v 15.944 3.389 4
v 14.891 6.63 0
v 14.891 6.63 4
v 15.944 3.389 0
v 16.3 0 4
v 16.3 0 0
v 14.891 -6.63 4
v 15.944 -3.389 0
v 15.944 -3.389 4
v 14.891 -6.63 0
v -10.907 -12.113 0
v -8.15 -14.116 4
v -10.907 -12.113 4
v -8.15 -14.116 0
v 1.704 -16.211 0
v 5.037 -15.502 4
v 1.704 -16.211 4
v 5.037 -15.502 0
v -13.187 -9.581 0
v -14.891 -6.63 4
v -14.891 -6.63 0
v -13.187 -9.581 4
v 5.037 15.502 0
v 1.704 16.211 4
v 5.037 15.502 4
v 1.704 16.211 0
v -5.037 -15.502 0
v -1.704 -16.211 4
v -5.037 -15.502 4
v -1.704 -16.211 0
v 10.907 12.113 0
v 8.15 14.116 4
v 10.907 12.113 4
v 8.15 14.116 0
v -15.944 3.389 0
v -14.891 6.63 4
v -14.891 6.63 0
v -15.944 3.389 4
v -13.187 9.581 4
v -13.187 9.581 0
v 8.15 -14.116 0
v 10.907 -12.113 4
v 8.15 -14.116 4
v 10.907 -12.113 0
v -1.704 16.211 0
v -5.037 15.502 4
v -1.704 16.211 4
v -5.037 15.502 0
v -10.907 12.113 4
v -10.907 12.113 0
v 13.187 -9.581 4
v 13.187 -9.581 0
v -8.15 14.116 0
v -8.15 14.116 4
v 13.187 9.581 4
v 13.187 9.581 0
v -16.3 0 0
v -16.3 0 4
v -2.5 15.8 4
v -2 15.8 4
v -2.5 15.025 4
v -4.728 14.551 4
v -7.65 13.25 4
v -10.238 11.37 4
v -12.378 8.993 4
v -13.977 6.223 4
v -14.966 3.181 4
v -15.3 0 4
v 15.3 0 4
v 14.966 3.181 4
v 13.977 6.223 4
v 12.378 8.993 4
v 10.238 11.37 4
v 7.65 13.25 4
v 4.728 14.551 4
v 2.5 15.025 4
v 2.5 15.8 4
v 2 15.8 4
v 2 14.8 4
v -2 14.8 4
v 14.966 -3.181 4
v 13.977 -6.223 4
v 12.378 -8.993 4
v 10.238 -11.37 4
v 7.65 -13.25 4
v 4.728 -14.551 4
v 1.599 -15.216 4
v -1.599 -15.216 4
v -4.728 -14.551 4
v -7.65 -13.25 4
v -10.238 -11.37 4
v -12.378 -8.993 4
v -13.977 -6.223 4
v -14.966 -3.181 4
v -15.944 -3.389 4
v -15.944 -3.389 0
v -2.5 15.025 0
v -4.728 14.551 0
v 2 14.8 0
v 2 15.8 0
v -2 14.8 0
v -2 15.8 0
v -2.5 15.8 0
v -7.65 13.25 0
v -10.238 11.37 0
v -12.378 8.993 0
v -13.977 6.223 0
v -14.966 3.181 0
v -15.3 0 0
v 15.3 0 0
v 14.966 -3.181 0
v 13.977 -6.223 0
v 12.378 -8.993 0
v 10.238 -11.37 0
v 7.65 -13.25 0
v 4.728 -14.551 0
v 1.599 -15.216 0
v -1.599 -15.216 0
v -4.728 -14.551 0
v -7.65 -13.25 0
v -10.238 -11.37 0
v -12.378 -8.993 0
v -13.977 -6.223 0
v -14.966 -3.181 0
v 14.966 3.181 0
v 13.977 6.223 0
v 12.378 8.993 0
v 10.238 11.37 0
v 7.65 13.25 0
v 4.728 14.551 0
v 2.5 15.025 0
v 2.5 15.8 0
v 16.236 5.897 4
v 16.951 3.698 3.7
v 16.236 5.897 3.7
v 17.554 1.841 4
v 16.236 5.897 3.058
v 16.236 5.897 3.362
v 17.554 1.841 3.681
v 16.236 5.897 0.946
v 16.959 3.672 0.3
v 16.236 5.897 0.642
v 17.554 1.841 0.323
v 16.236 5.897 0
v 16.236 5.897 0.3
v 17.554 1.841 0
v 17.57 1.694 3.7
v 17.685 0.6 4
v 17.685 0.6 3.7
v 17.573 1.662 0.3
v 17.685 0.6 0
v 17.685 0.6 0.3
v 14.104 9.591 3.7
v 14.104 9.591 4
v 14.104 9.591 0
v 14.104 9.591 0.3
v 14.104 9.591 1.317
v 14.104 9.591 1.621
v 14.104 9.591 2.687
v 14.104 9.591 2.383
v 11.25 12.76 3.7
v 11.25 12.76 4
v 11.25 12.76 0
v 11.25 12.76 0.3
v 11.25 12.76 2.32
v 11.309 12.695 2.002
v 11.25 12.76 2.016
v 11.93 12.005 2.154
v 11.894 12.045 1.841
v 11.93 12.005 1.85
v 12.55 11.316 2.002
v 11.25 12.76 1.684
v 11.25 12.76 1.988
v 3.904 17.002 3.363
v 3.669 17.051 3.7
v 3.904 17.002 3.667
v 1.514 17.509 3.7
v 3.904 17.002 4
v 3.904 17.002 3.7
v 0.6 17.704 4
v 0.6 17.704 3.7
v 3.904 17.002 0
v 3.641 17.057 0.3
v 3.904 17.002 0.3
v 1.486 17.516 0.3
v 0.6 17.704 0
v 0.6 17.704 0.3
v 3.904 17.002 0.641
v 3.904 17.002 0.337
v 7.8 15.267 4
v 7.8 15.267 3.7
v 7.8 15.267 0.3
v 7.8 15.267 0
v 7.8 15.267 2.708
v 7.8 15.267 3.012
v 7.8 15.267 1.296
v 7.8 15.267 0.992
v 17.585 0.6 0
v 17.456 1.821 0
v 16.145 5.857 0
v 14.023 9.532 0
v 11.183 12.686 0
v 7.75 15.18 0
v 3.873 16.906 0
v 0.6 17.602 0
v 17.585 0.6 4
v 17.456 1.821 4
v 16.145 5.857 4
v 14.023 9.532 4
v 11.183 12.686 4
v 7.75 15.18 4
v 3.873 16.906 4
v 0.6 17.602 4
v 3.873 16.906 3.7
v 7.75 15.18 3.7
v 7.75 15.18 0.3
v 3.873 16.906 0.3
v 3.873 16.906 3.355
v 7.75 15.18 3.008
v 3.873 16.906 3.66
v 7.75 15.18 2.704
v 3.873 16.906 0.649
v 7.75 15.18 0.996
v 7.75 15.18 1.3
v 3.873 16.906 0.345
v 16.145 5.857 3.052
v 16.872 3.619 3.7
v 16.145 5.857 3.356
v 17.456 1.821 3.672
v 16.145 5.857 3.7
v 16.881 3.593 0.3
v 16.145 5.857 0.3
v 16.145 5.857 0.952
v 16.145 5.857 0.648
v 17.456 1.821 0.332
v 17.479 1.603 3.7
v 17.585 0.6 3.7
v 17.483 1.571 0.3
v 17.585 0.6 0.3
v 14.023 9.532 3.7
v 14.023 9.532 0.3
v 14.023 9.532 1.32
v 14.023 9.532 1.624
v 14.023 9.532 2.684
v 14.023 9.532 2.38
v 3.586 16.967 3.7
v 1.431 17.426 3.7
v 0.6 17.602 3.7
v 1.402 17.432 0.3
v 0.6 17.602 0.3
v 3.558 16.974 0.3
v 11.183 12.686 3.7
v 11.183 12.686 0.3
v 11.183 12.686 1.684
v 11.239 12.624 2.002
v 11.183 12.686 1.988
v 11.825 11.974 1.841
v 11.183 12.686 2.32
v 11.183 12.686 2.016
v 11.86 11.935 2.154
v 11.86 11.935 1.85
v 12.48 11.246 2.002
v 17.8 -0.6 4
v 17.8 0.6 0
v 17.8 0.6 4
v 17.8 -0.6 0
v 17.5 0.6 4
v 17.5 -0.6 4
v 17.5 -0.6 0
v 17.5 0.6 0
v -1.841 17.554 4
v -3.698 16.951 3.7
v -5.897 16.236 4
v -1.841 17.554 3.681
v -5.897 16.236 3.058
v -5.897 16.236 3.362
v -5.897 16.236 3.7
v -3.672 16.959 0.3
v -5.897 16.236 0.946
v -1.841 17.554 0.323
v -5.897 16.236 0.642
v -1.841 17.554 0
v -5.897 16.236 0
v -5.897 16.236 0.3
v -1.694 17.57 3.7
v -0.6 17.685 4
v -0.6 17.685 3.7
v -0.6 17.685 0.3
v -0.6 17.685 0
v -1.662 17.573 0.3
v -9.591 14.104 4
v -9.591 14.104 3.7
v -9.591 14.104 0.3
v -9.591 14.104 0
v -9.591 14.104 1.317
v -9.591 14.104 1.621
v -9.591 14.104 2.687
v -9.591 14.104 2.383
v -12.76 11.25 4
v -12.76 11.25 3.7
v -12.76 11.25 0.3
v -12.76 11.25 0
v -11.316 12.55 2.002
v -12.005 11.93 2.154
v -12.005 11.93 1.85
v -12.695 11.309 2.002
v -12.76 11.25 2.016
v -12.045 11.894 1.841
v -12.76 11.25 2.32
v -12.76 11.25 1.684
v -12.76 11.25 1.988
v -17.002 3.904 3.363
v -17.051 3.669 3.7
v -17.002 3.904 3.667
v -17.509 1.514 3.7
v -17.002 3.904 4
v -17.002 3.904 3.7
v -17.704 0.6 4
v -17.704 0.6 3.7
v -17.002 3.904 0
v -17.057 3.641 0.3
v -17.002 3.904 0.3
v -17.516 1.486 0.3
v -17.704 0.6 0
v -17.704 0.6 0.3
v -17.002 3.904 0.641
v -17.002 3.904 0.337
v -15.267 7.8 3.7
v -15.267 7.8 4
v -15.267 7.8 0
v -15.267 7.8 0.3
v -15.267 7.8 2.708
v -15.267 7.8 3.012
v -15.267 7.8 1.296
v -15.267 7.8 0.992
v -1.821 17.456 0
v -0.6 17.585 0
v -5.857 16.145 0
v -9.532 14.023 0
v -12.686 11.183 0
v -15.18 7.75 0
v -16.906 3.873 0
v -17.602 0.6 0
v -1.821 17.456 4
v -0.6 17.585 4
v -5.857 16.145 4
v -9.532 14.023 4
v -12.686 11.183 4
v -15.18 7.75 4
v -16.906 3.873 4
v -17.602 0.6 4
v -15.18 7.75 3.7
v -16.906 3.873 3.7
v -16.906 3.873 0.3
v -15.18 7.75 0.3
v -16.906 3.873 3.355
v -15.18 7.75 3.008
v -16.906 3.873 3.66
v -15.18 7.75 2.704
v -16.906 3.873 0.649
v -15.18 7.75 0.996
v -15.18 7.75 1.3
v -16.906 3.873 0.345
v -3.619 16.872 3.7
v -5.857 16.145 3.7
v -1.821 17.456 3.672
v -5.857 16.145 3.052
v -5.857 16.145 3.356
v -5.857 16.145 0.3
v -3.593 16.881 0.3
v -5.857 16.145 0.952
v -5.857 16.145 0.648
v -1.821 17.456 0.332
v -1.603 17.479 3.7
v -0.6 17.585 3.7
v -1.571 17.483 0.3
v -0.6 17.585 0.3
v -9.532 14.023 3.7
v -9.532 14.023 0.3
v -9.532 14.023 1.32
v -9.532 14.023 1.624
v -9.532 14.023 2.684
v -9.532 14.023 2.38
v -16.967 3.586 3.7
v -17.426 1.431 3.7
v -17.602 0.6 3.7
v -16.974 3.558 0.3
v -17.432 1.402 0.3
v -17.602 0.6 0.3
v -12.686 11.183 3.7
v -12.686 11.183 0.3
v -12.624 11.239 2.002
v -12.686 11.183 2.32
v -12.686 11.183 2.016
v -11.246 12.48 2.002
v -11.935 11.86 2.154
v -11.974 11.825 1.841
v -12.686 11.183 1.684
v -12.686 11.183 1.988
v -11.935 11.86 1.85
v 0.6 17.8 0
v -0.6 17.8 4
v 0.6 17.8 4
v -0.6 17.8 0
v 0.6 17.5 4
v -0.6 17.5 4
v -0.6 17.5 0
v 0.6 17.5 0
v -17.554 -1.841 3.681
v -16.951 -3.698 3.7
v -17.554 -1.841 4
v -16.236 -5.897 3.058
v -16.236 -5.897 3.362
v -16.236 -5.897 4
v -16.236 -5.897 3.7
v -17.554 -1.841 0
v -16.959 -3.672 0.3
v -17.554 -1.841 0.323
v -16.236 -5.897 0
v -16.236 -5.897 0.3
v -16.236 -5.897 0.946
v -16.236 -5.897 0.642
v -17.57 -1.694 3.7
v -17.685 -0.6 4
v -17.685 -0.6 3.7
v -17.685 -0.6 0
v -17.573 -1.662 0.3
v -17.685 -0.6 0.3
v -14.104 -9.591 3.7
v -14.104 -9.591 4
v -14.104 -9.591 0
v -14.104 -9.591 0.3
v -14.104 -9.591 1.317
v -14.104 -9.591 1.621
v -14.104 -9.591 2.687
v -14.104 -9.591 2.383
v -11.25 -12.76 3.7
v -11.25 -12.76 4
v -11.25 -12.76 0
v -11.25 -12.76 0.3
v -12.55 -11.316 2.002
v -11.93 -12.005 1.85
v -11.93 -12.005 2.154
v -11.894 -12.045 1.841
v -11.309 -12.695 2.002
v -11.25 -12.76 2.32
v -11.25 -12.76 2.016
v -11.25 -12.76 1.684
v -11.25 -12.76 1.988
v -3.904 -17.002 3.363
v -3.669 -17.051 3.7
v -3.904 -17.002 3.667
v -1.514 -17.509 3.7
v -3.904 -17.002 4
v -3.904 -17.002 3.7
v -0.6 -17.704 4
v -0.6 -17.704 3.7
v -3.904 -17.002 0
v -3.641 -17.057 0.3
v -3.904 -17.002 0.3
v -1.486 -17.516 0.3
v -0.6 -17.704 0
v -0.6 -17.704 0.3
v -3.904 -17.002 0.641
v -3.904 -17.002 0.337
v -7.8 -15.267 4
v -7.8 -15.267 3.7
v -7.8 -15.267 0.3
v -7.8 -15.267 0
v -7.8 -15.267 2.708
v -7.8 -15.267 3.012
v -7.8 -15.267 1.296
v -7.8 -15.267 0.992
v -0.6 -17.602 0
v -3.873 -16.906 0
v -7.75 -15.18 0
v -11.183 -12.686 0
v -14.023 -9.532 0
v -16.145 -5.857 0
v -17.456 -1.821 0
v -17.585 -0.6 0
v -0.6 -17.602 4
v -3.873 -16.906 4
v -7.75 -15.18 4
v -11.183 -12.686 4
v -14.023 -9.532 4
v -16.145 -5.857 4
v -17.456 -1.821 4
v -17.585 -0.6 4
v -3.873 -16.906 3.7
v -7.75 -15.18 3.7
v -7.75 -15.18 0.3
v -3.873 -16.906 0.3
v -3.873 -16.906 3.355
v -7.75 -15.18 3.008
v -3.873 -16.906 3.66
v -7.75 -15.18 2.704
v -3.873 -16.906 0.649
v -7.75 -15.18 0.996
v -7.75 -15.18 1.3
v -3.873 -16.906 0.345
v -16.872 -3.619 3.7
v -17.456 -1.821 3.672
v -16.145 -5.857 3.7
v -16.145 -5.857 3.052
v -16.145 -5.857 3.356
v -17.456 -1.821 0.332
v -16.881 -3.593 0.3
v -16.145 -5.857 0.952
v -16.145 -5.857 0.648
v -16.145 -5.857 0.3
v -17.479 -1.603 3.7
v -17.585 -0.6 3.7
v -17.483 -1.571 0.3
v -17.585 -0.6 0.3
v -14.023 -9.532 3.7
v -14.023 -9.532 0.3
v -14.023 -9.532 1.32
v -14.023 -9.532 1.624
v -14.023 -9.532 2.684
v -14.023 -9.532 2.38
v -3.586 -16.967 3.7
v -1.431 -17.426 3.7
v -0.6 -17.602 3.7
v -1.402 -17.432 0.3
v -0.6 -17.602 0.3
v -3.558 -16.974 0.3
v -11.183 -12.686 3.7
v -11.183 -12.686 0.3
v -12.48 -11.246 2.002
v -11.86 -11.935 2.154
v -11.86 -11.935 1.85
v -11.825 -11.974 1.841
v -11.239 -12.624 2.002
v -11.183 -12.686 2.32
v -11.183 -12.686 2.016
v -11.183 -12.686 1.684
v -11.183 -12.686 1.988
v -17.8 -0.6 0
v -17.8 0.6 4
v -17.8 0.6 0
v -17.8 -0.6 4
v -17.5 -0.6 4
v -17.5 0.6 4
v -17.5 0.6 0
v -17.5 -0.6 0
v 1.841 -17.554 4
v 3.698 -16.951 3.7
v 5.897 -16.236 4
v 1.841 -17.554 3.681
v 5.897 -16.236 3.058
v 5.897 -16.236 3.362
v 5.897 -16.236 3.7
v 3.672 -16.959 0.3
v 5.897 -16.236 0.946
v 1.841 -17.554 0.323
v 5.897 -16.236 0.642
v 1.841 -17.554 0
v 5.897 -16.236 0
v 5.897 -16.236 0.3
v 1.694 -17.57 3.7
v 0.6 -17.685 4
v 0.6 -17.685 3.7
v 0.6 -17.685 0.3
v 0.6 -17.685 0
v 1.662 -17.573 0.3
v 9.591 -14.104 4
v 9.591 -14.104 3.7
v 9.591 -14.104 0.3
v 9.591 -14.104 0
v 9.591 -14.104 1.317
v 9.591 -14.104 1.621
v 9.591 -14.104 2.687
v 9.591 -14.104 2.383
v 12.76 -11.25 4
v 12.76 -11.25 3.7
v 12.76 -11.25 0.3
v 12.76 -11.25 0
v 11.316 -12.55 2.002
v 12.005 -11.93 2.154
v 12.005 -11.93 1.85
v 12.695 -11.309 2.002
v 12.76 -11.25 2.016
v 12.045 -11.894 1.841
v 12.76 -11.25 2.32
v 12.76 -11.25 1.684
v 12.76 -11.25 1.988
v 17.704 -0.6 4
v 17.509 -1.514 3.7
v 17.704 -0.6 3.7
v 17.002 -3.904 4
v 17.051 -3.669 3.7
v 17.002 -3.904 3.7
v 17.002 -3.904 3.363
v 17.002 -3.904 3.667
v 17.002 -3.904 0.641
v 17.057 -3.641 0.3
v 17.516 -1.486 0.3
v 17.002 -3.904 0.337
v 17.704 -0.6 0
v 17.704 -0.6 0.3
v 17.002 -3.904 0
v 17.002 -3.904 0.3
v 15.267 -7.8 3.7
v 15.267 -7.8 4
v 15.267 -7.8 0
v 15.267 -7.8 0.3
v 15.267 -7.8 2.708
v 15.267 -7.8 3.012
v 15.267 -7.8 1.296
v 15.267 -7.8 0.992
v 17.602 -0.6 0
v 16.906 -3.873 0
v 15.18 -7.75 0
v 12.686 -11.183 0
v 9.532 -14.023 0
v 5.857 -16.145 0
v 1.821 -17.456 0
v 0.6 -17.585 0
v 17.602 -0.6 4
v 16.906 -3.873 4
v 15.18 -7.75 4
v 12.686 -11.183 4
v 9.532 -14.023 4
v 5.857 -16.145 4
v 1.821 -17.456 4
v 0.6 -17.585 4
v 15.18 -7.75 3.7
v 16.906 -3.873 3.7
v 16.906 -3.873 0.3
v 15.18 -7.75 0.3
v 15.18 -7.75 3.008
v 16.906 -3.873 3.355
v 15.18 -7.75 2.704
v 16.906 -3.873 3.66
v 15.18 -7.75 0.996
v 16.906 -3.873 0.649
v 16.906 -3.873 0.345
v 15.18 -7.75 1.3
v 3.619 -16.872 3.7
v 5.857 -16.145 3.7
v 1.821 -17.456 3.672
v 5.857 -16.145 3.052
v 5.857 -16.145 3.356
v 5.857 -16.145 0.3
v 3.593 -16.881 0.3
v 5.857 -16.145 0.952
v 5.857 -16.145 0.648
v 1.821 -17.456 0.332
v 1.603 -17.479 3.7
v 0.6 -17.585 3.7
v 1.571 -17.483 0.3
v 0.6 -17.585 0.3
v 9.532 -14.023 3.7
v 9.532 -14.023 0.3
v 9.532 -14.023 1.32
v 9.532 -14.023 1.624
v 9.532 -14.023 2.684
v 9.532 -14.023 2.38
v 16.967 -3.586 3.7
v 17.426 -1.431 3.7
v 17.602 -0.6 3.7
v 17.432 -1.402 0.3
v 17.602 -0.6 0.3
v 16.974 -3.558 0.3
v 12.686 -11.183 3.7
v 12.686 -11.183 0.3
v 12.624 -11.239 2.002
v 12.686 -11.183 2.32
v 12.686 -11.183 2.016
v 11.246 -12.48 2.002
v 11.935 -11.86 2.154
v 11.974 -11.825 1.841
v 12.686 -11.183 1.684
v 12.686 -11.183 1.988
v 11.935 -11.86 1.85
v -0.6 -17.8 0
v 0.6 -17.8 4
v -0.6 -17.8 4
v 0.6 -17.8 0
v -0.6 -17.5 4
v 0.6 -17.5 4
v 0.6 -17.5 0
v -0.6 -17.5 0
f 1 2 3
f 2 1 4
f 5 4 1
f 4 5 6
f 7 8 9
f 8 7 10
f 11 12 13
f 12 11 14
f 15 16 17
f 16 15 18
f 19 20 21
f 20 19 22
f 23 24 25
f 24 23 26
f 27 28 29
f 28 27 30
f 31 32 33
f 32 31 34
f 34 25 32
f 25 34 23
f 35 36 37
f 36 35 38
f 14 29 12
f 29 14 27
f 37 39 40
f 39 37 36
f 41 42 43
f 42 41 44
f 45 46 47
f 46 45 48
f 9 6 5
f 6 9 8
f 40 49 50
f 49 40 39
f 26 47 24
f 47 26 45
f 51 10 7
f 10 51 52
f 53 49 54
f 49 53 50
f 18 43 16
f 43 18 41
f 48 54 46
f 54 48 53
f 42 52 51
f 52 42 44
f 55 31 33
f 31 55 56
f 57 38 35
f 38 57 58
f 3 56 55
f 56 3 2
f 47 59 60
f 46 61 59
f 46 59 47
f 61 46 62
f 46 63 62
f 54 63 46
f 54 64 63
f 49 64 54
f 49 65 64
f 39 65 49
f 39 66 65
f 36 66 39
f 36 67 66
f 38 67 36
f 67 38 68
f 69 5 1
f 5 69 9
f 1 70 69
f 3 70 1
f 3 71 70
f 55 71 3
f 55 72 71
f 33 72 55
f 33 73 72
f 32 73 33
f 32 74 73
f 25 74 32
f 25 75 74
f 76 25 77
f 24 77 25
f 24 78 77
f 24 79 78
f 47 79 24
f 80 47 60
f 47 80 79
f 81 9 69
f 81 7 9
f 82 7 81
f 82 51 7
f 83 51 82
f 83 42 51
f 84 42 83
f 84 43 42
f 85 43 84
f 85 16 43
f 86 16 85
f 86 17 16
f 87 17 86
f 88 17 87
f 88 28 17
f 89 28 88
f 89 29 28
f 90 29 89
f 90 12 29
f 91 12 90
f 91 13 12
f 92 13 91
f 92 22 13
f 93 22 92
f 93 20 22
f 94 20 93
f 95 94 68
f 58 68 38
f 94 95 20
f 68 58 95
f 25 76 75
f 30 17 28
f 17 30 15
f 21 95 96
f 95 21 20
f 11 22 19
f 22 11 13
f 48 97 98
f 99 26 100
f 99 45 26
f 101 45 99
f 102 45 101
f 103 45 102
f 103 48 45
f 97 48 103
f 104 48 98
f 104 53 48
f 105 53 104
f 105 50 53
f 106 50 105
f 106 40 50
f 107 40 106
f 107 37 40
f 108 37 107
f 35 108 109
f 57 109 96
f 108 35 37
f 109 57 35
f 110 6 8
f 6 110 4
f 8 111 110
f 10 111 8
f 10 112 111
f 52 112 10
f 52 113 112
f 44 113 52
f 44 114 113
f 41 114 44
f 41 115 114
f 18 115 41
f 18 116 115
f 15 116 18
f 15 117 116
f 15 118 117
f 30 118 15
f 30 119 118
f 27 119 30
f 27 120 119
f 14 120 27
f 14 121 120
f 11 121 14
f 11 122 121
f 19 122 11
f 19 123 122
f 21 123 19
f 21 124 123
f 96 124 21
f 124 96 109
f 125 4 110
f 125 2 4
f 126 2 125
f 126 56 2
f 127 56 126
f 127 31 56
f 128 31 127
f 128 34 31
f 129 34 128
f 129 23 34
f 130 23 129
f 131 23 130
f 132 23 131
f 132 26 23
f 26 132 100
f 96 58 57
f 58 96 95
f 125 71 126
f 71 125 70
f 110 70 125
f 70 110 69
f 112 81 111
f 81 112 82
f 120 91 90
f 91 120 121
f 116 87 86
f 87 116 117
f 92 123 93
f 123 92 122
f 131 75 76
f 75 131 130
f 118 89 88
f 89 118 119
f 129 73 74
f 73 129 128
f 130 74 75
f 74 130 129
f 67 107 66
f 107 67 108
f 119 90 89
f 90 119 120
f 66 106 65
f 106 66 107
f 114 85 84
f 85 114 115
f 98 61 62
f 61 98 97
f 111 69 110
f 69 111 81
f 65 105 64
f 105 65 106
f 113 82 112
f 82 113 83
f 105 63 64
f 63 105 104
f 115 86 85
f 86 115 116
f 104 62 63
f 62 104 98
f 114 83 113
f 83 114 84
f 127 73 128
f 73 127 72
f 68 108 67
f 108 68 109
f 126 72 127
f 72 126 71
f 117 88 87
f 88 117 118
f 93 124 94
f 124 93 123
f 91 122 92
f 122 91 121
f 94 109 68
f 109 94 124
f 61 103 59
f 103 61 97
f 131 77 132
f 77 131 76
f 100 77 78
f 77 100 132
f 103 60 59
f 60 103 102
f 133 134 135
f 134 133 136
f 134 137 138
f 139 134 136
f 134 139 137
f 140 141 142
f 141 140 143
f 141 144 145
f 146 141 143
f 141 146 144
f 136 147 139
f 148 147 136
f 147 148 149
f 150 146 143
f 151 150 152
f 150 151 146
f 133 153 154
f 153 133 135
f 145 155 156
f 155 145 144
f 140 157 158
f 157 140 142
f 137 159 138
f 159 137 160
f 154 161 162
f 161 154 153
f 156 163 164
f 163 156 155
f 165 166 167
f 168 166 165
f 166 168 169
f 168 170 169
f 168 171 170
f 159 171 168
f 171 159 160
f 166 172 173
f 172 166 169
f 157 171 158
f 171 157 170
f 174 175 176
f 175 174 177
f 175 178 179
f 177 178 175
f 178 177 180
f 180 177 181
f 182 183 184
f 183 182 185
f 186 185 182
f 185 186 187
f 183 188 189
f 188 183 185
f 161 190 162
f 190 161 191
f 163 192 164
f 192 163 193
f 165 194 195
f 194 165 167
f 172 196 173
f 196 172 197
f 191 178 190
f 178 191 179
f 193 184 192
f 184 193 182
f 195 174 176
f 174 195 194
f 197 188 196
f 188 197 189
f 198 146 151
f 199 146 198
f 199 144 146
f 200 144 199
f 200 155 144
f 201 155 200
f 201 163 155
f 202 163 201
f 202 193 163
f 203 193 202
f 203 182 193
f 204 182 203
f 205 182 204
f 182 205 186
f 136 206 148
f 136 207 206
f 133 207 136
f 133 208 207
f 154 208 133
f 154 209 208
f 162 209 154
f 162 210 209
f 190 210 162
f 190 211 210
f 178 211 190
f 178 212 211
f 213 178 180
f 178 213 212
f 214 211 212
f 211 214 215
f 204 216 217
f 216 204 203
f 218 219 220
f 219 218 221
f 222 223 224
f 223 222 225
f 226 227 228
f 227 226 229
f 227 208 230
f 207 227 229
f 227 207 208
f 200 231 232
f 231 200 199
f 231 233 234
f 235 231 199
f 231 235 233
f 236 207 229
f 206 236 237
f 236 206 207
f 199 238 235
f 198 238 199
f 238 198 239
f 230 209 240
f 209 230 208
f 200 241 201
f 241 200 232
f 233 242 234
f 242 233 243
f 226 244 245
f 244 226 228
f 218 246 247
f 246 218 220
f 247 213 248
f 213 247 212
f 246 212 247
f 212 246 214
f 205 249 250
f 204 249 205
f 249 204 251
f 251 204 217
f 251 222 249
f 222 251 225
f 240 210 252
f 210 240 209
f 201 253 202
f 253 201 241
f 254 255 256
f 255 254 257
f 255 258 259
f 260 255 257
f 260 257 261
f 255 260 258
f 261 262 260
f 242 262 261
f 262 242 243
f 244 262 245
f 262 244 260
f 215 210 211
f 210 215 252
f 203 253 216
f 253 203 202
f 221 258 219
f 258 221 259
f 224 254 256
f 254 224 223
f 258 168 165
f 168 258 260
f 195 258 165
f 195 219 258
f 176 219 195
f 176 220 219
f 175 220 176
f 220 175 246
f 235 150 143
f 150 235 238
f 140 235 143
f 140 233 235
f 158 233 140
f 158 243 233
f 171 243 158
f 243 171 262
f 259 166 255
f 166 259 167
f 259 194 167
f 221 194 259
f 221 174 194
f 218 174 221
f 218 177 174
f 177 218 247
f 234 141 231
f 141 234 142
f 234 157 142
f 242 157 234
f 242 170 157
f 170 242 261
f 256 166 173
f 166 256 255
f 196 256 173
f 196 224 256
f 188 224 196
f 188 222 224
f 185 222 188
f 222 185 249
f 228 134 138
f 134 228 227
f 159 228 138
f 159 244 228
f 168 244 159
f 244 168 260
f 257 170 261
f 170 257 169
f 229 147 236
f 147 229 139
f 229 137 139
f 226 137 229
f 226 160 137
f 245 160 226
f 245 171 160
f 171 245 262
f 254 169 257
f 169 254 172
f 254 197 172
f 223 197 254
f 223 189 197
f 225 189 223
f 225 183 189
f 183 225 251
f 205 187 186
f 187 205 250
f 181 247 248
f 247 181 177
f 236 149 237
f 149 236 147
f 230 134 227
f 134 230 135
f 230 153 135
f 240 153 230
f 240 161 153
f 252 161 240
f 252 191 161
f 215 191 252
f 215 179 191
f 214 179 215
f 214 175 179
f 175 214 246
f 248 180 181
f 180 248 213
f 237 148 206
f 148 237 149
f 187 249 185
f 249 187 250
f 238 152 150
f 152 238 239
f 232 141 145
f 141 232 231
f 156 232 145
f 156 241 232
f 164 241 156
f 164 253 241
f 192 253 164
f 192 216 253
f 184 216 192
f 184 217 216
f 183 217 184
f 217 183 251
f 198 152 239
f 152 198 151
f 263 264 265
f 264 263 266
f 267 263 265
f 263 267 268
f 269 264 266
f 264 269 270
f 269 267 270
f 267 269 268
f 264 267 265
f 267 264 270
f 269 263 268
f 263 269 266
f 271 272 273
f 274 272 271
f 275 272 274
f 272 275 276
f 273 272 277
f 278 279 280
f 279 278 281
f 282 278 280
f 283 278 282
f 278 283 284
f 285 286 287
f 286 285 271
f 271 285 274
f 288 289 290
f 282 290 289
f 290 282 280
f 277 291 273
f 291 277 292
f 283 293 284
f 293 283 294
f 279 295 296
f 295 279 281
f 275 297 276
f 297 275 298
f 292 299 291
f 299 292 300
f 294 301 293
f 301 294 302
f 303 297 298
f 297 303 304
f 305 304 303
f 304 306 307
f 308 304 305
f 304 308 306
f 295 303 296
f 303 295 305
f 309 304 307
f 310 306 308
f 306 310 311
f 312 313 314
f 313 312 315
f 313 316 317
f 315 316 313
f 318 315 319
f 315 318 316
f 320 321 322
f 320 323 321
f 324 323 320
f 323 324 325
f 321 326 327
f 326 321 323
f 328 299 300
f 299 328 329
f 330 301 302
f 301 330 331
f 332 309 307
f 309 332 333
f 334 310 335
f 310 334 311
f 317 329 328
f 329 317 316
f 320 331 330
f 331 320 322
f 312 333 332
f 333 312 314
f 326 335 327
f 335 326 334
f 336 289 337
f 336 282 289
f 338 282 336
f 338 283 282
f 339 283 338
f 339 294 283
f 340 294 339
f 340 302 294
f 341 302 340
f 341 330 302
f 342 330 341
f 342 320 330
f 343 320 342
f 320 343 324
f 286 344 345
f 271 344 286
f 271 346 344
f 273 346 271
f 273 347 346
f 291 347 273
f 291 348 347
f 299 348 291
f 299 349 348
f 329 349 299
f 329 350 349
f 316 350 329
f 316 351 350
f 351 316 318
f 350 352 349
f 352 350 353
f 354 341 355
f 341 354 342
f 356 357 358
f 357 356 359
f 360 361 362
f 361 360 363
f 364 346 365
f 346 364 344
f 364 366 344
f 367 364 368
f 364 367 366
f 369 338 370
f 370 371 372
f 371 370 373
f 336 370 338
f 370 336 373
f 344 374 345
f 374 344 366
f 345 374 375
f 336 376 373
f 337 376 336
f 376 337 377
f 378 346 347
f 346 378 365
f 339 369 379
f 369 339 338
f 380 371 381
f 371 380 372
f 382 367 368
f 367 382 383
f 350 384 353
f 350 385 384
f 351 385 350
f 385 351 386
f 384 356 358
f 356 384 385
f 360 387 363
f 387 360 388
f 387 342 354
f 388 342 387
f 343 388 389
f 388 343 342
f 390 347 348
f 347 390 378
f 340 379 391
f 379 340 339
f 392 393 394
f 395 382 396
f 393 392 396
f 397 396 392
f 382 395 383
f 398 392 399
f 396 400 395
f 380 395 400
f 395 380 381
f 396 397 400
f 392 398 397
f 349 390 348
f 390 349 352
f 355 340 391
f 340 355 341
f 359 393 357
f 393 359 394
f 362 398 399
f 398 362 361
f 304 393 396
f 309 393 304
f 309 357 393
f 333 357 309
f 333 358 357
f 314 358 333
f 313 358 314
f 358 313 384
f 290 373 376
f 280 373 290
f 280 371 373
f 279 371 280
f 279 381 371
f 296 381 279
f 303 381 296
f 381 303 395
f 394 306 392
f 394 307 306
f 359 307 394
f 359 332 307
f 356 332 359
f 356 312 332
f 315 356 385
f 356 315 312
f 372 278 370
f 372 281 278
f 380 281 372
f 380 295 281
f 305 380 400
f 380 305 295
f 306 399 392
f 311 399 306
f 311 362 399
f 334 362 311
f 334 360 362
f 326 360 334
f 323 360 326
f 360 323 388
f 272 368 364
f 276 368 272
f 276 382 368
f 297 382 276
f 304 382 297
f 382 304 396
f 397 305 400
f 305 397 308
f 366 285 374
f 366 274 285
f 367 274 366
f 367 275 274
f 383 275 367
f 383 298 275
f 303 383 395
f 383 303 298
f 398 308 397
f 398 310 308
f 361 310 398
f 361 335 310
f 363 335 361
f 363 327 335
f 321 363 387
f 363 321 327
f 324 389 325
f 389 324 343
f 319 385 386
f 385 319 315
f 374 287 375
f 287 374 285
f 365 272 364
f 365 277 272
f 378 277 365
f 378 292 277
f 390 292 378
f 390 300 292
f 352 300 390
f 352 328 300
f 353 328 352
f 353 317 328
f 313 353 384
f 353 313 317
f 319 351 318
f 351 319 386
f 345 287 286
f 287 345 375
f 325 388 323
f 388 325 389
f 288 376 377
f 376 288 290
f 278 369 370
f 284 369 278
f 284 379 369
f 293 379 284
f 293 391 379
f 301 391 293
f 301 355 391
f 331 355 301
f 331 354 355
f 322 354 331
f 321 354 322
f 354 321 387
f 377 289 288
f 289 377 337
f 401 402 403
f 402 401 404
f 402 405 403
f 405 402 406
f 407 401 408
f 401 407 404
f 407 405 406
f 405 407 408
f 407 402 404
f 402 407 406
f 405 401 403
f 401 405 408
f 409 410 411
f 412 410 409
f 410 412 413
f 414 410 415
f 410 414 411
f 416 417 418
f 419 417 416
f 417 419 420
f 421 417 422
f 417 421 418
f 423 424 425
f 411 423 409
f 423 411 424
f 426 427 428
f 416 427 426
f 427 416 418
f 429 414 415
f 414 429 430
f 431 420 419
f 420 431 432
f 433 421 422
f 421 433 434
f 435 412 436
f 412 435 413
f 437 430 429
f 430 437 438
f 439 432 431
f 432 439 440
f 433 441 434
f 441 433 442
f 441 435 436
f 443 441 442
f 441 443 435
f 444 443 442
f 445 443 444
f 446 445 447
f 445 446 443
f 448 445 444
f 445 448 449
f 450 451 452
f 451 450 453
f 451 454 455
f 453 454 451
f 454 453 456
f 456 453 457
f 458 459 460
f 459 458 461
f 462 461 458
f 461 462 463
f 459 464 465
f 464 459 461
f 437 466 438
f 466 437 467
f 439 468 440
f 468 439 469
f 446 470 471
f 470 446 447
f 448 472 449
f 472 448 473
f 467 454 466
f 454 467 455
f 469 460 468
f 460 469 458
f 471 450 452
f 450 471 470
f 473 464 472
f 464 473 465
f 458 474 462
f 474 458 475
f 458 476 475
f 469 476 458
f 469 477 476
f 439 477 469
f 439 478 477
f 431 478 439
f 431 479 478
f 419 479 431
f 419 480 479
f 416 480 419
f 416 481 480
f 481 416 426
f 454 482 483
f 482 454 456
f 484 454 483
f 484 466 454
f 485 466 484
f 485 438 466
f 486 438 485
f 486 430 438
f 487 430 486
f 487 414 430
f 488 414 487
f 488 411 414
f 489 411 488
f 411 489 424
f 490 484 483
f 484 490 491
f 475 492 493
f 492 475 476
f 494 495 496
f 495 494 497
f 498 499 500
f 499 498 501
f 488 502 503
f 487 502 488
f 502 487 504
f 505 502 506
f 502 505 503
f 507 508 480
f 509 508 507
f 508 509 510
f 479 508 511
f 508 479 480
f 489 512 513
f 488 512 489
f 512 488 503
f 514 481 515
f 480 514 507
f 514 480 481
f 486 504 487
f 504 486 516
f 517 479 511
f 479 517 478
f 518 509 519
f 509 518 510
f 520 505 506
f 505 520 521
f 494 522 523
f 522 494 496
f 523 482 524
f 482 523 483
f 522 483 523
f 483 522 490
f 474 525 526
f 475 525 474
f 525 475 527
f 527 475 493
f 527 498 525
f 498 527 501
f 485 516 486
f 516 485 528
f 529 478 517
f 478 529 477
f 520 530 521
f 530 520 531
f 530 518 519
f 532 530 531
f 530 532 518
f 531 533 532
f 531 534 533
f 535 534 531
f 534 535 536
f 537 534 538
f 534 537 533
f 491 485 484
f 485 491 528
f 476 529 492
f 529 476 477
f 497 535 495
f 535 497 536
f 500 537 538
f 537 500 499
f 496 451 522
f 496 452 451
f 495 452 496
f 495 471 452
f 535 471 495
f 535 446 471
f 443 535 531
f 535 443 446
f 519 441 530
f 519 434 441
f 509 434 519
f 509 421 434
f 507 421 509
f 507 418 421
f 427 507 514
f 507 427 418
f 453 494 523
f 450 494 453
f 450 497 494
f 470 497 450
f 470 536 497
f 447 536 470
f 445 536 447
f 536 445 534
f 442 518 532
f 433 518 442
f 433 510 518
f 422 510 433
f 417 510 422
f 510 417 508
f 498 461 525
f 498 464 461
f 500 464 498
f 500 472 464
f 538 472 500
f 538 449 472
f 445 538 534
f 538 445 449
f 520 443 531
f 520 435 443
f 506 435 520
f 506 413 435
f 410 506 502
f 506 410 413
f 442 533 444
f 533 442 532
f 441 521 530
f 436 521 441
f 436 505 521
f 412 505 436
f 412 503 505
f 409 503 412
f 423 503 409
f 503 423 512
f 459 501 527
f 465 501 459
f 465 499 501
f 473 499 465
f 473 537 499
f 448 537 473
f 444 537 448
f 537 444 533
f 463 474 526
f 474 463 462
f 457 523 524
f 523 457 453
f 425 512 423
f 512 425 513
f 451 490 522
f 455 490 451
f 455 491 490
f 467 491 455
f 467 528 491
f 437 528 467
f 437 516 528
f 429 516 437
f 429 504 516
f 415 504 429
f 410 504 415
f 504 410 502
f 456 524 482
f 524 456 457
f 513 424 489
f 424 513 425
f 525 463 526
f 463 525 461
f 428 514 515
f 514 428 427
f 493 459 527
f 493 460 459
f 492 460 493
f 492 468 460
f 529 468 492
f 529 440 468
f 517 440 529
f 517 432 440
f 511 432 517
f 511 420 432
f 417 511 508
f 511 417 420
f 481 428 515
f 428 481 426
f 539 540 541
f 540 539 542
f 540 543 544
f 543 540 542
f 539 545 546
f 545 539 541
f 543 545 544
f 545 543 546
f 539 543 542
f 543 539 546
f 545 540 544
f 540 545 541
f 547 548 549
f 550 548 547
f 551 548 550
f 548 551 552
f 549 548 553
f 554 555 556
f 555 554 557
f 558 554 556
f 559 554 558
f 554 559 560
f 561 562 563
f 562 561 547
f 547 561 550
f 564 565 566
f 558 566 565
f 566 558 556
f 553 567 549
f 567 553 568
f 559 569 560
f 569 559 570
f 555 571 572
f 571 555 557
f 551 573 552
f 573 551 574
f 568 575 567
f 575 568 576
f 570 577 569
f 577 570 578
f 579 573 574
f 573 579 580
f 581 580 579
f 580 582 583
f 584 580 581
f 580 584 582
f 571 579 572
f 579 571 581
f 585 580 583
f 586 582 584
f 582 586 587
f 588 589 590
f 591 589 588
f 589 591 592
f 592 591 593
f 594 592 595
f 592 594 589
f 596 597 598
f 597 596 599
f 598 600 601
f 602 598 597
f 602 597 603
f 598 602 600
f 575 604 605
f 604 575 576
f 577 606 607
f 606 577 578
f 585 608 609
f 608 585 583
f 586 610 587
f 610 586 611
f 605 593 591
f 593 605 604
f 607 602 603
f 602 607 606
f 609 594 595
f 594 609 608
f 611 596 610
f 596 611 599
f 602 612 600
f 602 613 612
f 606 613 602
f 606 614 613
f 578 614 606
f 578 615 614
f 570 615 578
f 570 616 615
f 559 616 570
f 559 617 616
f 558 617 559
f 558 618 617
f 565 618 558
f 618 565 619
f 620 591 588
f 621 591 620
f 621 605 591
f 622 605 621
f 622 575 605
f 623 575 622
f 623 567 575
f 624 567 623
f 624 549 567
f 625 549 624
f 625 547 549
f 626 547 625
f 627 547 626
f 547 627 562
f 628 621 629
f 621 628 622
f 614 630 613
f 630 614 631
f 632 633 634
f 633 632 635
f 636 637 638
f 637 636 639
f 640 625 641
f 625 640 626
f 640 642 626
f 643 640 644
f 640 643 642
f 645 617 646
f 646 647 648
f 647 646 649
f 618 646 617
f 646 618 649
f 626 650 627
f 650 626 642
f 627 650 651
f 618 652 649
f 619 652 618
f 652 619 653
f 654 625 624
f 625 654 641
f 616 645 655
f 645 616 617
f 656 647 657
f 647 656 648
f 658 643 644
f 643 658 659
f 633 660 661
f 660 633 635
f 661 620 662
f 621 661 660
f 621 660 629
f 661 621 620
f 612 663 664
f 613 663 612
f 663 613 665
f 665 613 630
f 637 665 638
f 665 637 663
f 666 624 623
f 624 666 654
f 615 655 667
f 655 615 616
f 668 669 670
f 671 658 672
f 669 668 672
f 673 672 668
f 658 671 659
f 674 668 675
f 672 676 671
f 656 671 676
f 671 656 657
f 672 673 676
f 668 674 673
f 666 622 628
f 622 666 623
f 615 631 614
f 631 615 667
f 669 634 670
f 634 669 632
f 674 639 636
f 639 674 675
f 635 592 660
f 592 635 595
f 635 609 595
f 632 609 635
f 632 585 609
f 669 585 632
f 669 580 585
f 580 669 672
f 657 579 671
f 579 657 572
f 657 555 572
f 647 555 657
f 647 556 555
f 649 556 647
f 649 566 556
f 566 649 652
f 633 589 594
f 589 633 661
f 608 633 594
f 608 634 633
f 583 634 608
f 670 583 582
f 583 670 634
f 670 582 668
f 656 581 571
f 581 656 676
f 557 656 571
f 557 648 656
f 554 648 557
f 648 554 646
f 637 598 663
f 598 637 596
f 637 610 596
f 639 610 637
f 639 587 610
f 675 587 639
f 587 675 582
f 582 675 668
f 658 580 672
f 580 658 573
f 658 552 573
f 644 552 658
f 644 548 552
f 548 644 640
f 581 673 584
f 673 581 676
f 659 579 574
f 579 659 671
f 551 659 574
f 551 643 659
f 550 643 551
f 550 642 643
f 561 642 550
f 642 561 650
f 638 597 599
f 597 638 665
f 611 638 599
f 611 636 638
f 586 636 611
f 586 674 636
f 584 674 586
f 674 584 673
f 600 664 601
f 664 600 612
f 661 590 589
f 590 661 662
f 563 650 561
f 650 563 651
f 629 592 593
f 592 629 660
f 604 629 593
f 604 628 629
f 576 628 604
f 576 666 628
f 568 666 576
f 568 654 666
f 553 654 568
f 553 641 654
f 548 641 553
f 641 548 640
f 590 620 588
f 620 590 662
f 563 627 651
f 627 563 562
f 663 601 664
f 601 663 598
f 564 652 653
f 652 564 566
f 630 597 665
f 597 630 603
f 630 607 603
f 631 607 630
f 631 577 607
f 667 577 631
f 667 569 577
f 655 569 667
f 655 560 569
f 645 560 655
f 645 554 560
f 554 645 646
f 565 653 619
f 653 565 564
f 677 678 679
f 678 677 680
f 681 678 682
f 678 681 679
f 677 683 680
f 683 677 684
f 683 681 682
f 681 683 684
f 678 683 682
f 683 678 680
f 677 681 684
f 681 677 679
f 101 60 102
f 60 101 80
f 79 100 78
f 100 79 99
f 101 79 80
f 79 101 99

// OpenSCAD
$fn = 30;

union() {
	color(alpha = 1.0, c = [1, 0.1, 0.5]) {
		difference() {
			cylinder(h = 4, r1 = 16.3, r2 = 16.3);
			translate(v = [0, 0, -1]) {
				cylinder(h = 6, r1 = 15.3, r2 = 15.3);
			}
			translate(v = [-2.5, 15.8, 0]) {
				rotate(a = [90, 0, 0]) {
					cube(size = [5.0, 5.0, 1]);
				}
			}
		}
	}
	color(alpha = 1.0, c = [0, 0, 1]) {
		union() {
			rotate(a = [0, 0, 0]) {
				union() {
					translate(v = [0.6, 0.6, 0]) {
						union() {
							intersection() {
								translate(v = [0, 0, 1.85]) {
									rotate(a = [6.6, 0, 0]) {
										rotate(a = [0, 6.6, 0]) {
											cube(size = [110, 110, 0.3]);
										}
									}
								}
								translate(v = [-3.0, -3.0, 0]) {
									difference() {
										cylinder(h = 4, r1 = 20.400000000000002, r2 = 20.400000000000002);
										translate(v = [0, 0, -1]) {
											cylinder(h = 6, r1 = 20.3, r2 = 20.3);
										}
									}
								}
								cube(size = [20.3, 20.3, 4]);
							}
							intersection() {
								translate(v = [0, 0, 1.85]) {
									rotate(a = [-6.6, 0, 0]) {
										rotate(a = [0, -6.6, 0]) {
											cube(size = [110, 110, 0.3]);
										}
									}
								}
								translate(v = [-3.0, -3.0, 0]) {
									difference() {
										cylinder(h = 4, r1 = 20.400000000000002, r2 = 20.400000000000002);
										translate(v = [0, 0, -1]) {
											cylinder(h = 6, r1 = 20.3, r2 = 20.3);
										}
									}
								}
								cube(size = [20.3, 20.3, 4]);
							}
							intersection() {
								translate(v = [0, 0, 3.7]) {
									cube(size = [110, 110, 0.3]);
								}
								translate(v = [-3.0, -3.0, 0]) {
									difference() {
										cylinder(h = 4, r1 = 20.400000000000002, r2 = 20.400000000000002);
										translate(v = [0, 0, -1]) {
											cylinder(h = 6, r1 = 20.3, r2 = 20.3);
										}
									}
								}
								cube(size = [20.3, 20.3, 4]);
							}
							intersection() {
								translate(v = [0, 0, 0]) {
									cube(size = [110, 110, 0.3]);
								}
								translate(v = [-3.0, -3.0, 0]) {
									difference() {
										cylinder(h = 4, r1 = 20.400000000000002, r2 = 20.400000000000002);
										translate(v = [0, 0, -1]) {
											cylinder(h = 6, r1 = 20.3, r2 = 20.3);
										}
									}
								}
								cube(size = [20.3, 20.3, 4]);
							}
						}
					}
					translate(v = [0, 0, 0]) {
						translate(v = [17.5, 0, 0]) {
							cube(size = [0.3, 0.6, 4]);
						}
					}
					translate(v = [0, -0.6, 0]) {
						translate(v = [17.5, 0, 0]) {
							cube(size = [0.3, 0.6, 4]);
						}
					}
				}
			}
			rotate(a = [0, 0, 90]) {
				union() {
					translate(v = [0.6, 0.6, 0]) {
						union() {
							intersection() {
								translate(v = [0, 0, 1.85]) {
									rotate(a = [6.6, 0, 0]) {
										rotate(a = [0, 6.6, 0]) {
											cube(size = [110, 110, 0.3]);
										}
									}
								}
								translate(v = [-3.0, -3.0, 0]) {
									difference() {
										cylinder(h = 4, r1 = 20.400000000000002, r2 = 20.400000000000002);
										translate(v = [0, 0, -1]) {
											cylinder(h = 6, r1 = 20.3, r2 = 20.3);
										}
									}
								}
								cube(size = [20.3, 20.3, 4]);
							}
							intersection() {
								translate(v = [0, 0, 1.85]) {
									rotate(a = [-6.6, 0, 0]) {
										rotate(a = [0, -6.6, 0]) {
											cube(size = [110, 110, 0.3]);
										}
									}
								}
								translate(v = [-3.0, -3.0, 0]) {
									difference() {
										cylinder(h = 4, r1 = 20.400000000000002, r2 = 20.400000000000002);
										translate(v = [0, 0, -1]) {
											cylinder(h = 6, r1 = 20.3, r2 = 20.3);
										}
									}
								}
								cube(size = [20.3, 20.3, 4]);
							}
							intersection() {
								translate(v = [0, 0, 3.7]) {
									cube(size = [110, 110, 0.3]);
								}
								translate(v = [-3.0, -3.0, 0]) {
									difference() {
										cylinder(h = 4, r1 = 20.400000000000002, r2 = 20.400000000000002);
										translate(v = [0, 0, -1]) {
											cylinder(h = 6, r1 = 20.3, r2 = 20.3);
										}
									}
								}
								cube(size = [20.3, 20.3, 4]);
							}
							intersection() {
								translate(v = [0, 0, 0]) {
									cube(size = [110, 110, 0.3]);
								}
								translate(v = [-3.0, -3.0, 0]) {
									difference() {
										cylinder(h = 4, r1 = 20.400000000000002, r2 = 20.400000000000002);
										translate(v = [0, 0, -1]) {
											cylinder(h = 6, r1 = 20.3, r2 = 20.3);
										}
									}
								}
								cube(size = [20.3, 20.3, 4]);
							}
						}
					}
					translate(v = [0, 0, 0]) {
						translate(v = [17.5, 0, 0]) {
							cube(size = [0.3, 0.6, 4]);
						}
					}
					translate(v = [0, -0.6, 0]) {
						translate(v = [17.5, 0, 0]) {
							cube(size = [0.3, 0.6, 4]);
						}
					}
				}
			}
			rotate(a = [0, 0, 180]) {
				union() {
					translate(v = [0.6, 0.6, 0]) {
						union() {
							intersection() {
								translate(v = [0, 0, 1.85]) {
									rotate(a = [6.6, 0, 0]) {
										rotate(a = [0, 6.6, 0]) {
											cube(size = [110, 110, 0.3]);
										}
									}
								}
								translate(v = [-3.0, -3.0, 0]) {
									difference() {
										cylinder(h = 4, r1 = 20.400000000000002, r2 = 20.400000000000002);
										translate(v = [0, 0, -1]) {
											cylinder(h = 6, r1 = 20.3, r2 = 20.3);
										}
									}
								}
								cube(size = [20.3, 20.3, 4]);
							}
							intersection() {
								translate(v = [0, 0, 1.85]) {
									rotate(a = [-6.6, 0, 0]) {
										rotate(a = [0, -6.6, 0]) {
											cube(size = [110, 110, 0.3]);
										}
									}
								}
								translate(v = [-3.0, -3.0, 0]) {
									difference() {
										cylinder(h = 4, r1 = 20.400000000000002, r2 = 20.400000000000002);
										translate(v = [0, 0, -1]) {
											cylinder(h = 6, r1 = 20.3, r2 = 20.3);
										}
									}
								}
								cube(size = [20.3, 20.3, 4]);
							}
							intersection() {
								translate(v = [0, 0, 3.7]) {
									cube(size = [110, 110, 0.3]);
								}
								translate(v = [-3.0, -3.0, 0]) {
									difference() {
										cylinder(h = 4, r1 = 20.400000000000002, r2 = 20.400000000000002);
										translate(v = [0, 0, -1]) {
											cylinder(h = 6, r1 = 20.3, r2 = 20.3);
										}
									}
								}
								cube(size = [20.3, 20.3, 4]);
							}
							intersection() {
								translate(v = [0, 0, 0]) {
									cube(size = [110, 110, 0.3]);
								}
								translate(v = [-3.0, -3.0, 0]) {
									difference() {
										cylinder(h = 4, r1 = 20.400000000000002, r2 = 20.400000000000002);
										translate(v = [0, 0, -1]) {
											cylinder(h = 6, r1 = 20.3, r2 = 20.3);
										}
									}
								}
								cube(size = [20.3, 20.3, 4]);
							}
						}
					}
					translate(v = [0, 0, 0]) {
						translate(v = [17.5, 0, 0]) {
							cube(size = [0.3, 0.6, 4]);
						}
					}
					translate(v = [0, -0.6, 0]) {
						translate(v = [17.5, 0, 0]) {
							cube(size = [0.3, 0.6, 4]);
						}
					}
				}
			}
			rotate(a = [0, 0, 270]) {
				union() {
					translate(v = [0.6, 0.6, 0]) {
						union() {
							intersection() {
								translate(v = [0, 0, 1.85]) {
									rotate(a = [6.6, 0, 0]) {
										rotate(a = [0, 6.6, 0]) {
											cube(size = [110, 110, 0.3]);
										}
									}
								}
								translate(v = [-3.0, -3.0, 0]) {
									difference() {
										cylinder(h = 4, r1 = 20.400000000000002, r2 = 20.400000000000002);
										translate(v = [0, 0, -1]) {
											cylinder(h = 6, r1 = 20.3, r2 = 20.3);
										}
									}
								}
								cube(size = [20.3, 20.3, 4]);
							}
							intersection() {
								translate(v = [0, 0, 1.85]) {
									rotate(a = [-6.6, 0, 0]) {
										rotate(a = [0, -6.6, 0]) {
											cube(size = [110, 110, 0.3]);
										}
									}
								}
								translate(v = [-3.0, -3.0, 0]) {
									difference() {
										cylinder(h = 4, r1 = 20.400000000000002, r2 = 20.400000000000002);
										translate(v = [0, 0, -1]) {
											cylinder(h = 6, r1 = 20.3, r2 = 20.3);
										}
									}
								}
								cube(size = [20.3, 20.3, 4]);
							}
							intersection() {
								translate(v = [0, 0, 3.7]) {
									cube(size = [110, 110, 0.3]);
								}
								translate(v = [-3.0, -3.0, 0]) {
									difference() {
										cylinder(h = 4, r1 = 20.400000000000002, r2 = 20.400000000000002);
										translate(v = [0, 0, -1]) {
											cylinder(h = 6, r1 = 20.3, r2 = 20.3);
										}
									}
								}
								cube(size = [20.3, 20.3, 4]);
							}
							intersection() {
								translate(v = [0, 0, 0]) {
									cube(size = [110, 110, 0.3]);
								}
								translate(v = [-3.0, -3.0, 0]) {
									difference() {
										cylinder(h = 4, r1 = 20.400000000000002, r2 = 20.400000000000002);
										translate(v = [0, 0, -1]) {
											cylinder(h = 6, r1 = 20.3, r2 = 20.3);
										}
									}
								}
								cube(size = [20.3, 20.3, 4]);
							}
						}
					}
					translate(v = [0, 0, 0]) {
						translate(v = [17.5, 0, 0]) {
							cube(size = [0.3, 0.6, 4]);
						}
					}
					translate(v = [0, -0.6, 0]) {
						translate(v = [17.5, 0, 0]) {
							cube(size = [0.3, 0.6, 4]);
						}
					}
				}
			}
		}
	}
	translate(v = [-2.0, 15.8, 0]) {
		rotate(a = [90, 0, 0]) {
			cube(size = [4, 4, 1]);
		}
	}
}
